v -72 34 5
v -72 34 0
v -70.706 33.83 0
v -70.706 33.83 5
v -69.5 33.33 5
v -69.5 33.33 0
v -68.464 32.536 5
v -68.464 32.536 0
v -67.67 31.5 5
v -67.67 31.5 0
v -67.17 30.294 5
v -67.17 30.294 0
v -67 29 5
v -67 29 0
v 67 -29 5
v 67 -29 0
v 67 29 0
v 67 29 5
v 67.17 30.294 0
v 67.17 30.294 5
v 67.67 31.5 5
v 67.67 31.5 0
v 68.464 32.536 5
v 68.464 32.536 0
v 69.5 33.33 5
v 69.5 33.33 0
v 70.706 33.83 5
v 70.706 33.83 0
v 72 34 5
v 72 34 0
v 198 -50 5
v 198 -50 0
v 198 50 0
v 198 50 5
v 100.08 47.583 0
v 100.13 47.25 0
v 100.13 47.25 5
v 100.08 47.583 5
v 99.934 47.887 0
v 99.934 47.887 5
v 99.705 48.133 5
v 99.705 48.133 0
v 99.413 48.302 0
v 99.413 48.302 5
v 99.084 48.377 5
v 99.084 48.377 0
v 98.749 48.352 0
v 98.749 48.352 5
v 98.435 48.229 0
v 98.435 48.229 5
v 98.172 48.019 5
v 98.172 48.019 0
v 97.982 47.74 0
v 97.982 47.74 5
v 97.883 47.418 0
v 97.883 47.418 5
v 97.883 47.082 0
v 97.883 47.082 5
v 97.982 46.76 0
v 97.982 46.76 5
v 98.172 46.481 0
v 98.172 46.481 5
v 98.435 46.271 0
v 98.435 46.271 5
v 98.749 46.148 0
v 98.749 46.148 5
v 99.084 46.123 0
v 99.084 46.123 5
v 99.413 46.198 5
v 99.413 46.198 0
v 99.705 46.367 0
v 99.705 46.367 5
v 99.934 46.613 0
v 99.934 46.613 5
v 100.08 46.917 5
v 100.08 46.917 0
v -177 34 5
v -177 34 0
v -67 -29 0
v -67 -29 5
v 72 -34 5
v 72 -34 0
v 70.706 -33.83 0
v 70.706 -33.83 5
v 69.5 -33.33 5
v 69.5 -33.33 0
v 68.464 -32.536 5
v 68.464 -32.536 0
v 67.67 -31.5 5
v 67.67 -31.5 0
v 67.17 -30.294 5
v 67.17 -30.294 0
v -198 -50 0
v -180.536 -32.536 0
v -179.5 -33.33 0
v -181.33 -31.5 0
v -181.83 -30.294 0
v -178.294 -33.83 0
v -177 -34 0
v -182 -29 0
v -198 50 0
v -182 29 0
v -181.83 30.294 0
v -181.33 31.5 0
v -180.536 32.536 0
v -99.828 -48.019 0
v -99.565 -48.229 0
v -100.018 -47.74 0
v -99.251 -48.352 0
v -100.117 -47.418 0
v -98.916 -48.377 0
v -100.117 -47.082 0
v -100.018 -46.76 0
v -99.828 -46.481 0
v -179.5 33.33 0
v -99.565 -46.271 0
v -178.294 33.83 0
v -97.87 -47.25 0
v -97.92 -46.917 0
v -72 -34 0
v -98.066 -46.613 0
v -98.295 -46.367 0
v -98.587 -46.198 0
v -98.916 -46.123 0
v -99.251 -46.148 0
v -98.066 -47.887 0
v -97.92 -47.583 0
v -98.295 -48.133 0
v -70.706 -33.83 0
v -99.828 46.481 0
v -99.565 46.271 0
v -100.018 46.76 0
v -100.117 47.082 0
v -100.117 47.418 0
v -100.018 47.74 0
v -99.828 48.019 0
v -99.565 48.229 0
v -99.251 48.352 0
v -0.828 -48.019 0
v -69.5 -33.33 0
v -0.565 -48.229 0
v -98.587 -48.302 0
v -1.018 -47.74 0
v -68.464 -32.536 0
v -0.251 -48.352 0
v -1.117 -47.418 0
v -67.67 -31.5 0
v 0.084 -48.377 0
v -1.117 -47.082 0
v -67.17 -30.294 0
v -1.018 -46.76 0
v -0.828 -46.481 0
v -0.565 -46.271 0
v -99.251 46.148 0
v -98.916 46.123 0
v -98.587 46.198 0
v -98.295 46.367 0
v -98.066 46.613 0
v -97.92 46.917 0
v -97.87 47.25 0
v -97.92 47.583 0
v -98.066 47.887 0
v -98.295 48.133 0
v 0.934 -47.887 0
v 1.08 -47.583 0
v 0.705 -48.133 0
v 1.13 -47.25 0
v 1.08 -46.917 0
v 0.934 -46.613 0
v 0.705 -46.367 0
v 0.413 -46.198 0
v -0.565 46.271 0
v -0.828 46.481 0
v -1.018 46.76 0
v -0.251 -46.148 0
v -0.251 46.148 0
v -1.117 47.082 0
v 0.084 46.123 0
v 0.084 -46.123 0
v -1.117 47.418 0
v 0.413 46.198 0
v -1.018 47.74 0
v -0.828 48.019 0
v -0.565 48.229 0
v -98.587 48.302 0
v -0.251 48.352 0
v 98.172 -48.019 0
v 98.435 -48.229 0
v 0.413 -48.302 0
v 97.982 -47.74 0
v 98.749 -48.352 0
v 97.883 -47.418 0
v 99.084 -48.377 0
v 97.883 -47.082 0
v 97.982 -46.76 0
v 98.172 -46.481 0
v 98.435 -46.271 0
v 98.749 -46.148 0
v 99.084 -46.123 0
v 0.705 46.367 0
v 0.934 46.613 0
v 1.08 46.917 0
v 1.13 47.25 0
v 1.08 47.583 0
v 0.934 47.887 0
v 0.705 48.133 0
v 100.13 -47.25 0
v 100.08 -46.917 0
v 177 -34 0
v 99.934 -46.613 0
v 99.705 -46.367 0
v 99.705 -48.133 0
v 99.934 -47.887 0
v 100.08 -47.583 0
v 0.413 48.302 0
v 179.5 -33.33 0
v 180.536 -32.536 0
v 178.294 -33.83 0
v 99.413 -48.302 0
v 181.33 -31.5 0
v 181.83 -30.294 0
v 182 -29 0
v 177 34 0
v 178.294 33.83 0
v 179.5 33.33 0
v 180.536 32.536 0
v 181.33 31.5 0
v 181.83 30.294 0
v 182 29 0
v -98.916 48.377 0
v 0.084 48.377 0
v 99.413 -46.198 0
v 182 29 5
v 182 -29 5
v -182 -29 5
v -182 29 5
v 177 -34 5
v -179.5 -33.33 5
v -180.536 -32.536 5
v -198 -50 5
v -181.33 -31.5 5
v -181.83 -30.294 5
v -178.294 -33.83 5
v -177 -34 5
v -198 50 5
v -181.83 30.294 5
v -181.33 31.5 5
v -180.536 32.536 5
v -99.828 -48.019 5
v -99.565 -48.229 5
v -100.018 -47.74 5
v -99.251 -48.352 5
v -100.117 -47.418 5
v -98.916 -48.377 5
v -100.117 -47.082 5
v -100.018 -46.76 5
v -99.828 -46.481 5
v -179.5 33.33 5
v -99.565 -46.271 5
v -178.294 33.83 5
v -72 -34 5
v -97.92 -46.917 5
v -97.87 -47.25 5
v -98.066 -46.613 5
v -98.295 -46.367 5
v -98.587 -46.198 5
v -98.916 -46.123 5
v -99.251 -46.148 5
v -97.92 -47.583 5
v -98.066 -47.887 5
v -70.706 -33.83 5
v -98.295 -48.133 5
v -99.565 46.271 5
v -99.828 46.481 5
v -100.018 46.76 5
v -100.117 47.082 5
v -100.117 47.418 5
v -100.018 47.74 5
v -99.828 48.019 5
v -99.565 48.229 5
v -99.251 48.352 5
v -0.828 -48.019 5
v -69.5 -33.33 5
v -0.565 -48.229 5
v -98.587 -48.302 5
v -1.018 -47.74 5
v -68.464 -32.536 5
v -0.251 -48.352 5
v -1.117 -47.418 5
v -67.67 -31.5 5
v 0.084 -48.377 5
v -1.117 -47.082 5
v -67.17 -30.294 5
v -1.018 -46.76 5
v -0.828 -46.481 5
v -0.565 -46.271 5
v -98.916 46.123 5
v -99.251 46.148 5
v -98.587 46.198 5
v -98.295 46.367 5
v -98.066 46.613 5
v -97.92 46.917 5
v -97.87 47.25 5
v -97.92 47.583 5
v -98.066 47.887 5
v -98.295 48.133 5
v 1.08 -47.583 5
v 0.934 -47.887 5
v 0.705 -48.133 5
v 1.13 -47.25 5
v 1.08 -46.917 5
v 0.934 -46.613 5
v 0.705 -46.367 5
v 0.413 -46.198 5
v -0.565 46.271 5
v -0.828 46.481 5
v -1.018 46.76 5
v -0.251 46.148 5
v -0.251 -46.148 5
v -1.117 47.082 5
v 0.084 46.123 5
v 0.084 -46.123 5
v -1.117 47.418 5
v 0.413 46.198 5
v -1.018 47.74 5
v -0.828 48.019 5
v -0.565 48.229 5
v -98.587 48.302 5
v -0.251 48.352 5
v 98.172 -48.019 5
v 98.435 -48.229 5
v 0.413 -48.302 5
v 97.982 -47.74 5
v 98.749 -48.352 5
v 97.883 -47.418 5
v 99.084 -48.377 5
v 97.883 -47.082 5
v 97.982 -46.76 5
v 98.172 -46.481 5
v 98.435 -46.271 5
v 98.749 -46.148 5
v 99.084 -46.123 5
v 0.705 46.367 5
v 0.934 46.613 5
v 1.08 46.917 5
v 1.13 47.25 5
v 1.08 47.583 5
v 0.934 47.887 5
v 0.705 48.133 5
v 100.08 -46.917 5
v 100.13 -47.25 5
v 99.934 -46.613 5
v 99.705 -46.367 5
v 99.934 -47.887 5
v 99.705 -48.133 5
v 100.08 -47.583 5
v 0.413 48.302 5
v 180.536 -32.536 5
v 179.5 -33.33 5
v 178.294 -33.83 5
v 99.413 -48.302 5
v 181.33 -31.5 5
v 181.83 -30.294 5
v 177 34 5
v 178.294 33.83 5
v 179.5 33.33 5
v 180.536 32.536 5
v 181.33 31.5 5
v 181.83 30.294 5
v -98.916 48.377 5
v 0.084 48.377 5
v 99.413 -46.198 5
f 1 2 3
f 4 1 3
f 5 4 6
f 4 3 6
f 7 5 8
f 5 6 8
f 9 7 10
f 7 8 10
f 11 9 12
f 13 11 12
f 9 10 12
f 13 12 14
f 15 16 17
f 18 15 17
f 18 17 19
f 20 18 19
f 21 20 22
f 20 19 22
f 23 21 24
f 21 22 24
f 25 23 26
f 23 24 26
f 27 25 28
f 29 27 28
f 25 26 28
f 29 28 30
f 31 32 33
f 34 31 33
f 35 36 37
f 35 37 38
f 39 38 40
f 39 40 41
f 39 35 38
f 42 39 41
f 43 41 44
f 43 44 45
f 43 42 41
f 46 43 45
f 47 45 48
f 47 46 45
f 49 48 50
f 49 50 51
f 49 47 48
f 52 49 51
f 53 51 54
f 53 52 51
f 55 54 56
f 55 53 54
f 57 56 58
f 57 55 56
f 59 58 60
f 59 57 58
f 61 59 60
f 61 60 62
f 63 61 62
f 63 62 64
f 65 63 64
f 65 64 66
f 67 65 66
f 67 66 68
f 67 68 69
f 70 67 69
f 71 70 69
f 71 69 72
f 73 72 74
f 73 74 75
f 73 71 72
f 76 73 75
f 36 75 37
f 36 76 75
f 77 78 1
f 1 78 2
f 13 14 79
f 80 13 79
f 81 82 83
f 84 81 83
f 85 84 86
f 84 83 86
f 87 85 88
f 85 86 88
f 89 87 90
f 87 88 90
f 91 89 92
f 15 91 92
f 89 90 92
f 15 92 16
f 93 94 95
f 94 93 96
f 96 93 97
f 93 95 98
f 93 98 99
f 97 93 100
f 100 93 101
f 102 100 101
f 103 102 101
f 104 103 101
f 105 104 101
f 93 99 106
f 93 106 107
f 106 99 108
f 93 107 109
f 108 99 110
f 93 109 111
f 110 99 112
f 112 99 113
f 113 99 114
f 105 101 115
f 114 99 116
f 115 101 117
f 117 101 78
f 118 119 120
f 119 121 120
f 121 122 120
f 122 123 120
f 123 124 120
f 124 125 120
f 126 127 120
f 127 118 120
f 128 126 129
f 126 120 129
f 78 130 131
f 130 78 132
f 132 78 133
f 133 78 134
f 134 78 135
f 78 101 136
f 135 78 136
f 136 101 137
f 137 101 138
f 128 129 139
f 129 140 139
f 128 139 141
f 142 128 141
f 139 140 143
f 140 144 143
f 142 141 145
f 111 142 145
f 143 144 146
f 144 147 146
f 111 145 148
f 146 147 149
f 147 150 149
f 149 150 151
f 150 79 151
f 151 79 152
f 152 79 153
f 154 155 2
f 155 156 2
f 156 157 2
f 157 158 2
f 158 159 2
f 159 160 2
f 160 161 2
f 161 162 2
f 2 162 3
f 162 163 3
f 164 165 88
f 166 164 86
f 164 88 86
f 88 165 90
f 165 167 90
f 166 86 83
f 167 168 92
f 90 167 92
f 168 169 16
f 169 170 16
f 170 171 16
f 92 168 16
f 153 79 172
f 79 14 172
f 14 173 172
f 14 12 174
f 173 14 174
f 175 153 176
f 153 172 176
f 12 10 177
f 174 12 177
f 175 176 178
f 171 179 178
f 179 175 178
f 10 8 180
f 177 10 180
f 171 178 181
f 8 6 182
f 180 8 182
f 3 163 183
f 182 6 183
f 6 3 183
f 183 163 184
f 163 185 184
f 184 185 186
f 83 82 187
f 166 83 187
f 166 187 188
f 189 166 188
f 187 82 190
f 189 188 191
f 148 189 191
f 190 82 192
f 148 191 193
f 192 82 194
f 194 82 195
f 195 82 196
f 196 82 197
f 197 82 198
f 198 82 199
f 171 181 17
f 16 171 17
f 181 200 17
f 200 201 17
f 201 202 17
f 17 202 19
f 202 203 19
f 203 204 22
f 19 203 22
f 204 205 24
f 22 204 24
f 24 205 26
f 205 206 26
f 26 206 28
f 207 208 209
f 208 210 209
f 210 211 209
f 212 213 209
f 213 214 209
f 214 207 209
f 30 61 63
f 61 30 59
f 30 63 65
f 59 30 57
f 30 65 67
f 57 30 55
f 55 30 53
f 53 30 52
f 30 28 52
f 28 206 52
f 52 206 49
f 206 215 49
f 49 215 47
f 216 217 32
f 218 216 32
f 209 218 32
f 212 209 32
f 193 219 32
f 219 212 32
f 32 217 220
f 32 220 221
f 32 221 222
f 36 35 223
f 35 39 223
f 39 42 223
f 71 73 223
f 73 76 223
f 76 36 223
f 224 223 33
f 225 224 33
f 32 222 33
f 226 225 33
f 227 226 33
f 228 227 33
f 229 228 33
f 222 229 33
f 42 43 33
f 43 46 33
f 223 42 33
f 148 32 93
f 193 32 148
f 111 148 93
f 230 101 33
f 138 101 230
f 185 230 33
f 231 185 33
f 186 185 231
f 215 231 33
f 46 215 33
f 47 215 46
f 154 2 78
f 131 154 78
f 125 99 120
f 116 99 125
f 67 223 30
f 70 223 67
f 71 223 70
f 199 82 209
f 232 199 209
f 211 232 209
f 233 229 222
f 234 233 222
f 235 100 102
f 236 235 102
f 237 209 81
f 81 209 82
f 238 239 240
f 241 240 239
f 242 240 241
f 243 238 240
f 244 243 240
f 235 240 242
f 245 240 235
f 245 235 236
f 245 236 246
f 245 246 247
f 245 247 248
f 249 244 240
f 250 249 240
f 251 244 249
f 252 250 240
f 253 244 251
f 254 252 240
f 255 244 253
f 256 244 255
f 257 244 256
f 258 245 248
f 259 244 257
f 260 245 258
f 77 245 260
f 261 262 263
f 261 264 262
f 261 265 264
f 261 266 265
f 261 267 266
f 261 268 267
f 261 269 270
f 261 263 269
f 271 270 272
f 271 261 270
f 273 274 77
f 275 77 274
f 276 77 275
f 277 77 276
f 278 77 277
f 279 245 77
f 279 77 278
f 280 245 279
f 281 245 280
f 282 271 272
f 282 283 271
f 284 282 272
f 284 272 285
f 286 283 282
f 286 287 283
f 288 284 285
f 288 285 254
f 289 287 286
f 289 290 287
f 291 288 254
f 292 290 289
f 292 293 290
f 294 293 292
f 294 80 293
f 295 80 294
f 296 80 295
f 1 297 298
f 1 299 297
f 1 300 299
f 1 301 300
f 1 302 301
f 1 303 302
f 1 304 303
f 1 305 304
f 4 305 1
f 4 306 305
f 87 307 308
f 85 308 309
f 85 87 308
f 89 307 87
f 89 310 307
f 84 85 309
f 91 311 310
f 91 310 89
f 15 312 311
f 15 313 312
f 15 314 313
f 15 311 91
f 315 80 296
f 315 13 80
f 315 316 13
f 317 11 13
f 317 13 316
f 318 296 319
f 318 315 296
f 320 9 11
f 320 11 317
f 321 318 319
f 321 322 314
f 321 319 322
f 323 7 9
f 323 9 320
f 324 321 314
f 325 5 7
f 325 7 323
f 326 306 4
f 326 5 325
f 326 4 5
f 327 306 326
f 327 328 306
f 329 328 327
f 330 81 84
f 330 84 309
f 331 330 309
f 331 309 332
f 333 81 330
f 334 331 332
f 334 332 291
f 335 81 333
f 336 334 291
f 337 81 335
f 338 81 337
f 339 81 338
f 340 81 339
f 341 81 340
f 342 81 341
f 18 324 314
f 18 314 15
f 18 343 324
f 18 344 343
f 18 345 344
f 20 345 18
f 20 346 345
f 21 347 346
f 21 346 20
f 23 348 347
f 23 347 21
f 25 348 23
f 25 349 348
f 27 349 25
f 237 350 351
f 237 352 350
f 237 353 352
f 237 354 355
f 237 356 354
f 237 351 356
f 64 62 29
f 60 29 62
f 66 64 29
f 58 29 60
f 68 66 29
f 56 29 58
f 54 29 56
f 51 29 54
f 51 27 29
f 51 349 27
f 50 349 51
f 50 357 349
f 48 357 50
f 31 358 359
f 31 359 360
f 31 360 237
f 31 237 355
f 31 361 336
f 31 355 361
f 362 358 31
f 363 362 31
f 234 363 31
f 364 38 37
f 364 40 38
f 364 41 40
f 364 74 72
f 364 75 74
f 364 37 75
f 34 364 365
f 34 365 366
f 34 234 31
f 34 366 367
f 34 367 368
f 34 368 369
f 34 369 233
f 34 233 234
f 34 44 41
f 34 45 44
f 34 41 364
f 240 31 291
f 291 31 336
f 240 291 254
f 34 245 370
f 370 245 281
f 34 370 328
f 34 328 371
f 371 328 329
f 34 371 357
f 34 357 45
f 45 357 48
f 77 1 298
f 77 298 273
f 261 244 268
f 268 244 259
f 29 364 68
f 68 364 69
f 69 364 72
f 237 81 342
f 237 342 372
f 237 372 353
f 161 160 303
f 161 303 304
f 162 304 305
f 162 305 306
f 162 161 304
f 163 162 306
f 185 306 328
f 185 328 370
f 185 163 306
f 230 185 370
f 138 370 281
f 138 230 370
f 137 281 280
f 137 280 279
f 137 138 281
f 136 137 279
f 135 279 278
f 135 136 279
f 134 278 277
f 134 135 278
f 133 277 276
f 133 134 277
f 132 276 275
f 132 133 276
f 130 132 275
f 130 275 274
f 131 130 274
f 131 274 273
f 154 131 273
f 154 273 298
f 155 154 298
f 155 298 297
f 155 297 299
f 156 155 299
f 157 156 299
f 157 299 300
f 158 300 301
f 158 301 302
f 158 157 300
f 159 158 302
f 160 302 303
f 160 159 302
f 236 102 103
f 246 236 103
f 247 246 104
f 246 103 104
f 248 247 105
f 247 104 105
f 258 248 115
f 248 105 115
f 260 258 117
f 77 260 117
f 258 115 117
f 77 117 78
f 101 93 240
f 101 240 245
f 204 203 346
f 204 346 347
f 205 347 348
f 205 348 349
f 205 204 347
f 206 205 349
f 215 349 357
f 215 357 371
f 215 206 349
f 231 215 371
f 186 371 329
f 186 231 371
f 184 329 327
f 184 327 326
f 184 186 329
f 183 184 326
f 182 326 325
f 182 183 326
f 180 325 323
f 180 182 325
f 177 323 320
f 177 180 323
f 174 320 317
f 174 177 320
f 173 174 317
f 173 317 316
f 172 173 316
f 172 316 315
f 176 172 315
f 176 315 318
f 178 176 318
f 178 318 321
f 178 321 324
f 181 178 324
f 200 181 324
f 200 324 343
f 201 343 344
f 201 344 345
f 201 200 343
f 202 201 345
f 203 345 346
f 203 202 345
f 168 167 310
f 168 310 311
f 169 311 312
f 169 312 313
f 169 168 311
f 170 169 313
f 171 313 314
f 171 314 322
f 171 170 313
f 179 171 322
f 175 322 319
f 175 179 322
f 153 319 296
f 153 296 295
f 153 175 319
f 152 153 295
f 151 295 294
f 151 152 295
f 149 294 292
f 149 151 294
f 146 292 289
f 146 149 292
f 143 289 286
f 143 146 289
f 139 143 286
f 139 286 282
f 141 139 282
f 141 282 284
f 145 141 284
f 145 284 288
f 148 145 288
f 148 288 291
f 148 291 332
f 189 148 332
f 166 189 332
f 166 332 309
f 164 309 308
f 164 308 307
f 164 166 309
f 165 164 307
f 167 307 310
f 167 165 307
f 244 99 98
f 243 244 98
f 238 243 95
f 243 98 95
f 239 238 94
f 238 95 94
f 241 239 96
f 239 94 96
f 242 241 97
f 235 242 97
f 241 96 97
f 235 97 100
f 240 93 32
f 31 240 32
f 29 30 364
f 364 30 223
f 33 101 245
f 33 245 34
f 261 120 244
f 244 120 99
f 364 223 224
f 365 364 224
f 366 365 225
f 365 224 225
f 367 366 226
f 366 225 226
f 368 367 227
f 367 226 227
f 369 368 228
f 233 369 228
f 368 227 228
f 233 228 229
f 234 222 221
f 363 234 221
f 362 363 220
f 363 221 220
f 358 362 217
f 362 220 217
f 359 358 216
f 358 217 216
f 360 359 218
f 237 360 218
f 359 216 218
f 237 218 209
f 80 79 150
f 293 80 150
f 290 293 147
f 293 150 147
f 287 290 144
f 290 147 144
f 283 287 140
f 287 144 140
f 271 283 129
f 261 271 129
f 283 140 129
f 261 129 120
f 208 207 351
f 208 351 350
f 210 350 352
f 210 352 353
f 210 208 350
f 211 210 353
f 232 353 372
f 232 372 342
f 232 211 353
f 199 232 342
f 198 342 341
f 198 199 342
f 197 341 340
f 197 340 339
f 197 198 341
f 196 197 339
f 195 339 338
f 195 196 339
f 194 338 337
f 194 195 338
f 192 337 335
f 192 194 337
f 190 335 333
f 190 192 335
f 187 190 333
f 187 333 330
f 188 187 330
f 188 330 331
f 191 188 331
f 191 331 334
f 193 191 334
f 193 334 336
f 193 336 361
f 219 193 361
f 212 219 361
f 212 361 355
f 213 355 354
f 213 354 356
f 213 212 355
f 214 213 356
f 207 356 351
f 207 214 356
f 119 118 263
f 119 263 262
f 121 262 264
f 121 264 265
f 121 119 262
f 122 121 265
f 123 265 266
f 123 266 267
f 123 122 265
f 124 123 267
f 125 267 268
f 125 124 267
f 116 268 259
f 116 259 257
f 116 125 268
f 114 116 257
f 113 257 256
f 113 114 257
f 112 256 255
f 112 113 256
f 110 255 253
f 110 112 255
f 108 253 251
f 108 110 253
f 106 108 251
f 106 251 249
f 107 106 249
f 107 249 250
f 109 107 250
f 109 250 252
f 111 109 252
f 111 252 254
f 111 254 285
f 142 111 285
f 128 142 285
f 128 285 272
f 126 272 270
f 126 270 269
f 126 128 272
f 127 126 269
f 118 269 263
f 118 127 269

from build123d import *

# Parameters (mm, degrees)
F0_W     = 396
F0_H     = 100
F0_R     = 1.13
F1_DEPTH = 5


with BuildPart() as f1:
    # F0 (on Top) → F1 (new body)
    with BuildSketch(Plane.XY):
        Rectangle(F0_W, F0_H)
        with Locations((-99, -47.25)):
            Circle(F0_R, mode=Mode.SUBTRACT)
        with Locations((0, -47.25)):
            Circle(F0_R, mode=Mode.SUBTRACT)
        with Locations((99, -47.25)):
            Circle(F0_R, mode=Mode.SUBTRACT)
        with BuildLine():
            ThreePointArc((-182, 29), (-180.535534, 32.535534), (-177, 34))
            Line((-177, 34), (-72, 34))
            ThreePointArc((-72, 34), (-68.464466, 32.535534), (-67, 29))
            Line((-67, 29), (-67, -29))
            ThreePointArc((-67, -29), (-68.464466, -32.535534), (-72, -34))
            Line((-72, -34), (-177, -34))
            ThreePointArc((-177, -34), (-180.535534, -32.535534), (-182, -29))
            Line((-182, -29), (-182, 29))
        make_face(mode=Mode.SUBTRACT)
        with Locations((-99, 47.25)):
            Circle(F0_R, mode=Mode.SUBTRACT)
        with BuildLine():
            ThreePointArc((67, 29), (68.464466, 32.535534), (72, 34))
            Line((72, 34), (177, 34))
            ThreePointArc((177, 34), (180.535534, 32.535534), (182, 29))
            Line((182, 29), (182, -29))
            ThreePointArc((182, -29), (180.535534, -32.535534), (177, -34))
            Line((177, -34), (72, -34))
            ThreePointArc((72, -34), (68.464466, -32.535534), (67, -29))
            Line((67, -29), (67, 29))
        make_face(mode=Mode.SUBTRACT)
        with Locations((0, 47.25)):
            Circle(F0_R, mode=Mode.SUBTRACT)
        with Locations((99, 47.25)):
            Circle(F0_R, mode=Mode.SUBTRACT)
    extrude(amount=F1_DEPTH)


solid = f1.part
